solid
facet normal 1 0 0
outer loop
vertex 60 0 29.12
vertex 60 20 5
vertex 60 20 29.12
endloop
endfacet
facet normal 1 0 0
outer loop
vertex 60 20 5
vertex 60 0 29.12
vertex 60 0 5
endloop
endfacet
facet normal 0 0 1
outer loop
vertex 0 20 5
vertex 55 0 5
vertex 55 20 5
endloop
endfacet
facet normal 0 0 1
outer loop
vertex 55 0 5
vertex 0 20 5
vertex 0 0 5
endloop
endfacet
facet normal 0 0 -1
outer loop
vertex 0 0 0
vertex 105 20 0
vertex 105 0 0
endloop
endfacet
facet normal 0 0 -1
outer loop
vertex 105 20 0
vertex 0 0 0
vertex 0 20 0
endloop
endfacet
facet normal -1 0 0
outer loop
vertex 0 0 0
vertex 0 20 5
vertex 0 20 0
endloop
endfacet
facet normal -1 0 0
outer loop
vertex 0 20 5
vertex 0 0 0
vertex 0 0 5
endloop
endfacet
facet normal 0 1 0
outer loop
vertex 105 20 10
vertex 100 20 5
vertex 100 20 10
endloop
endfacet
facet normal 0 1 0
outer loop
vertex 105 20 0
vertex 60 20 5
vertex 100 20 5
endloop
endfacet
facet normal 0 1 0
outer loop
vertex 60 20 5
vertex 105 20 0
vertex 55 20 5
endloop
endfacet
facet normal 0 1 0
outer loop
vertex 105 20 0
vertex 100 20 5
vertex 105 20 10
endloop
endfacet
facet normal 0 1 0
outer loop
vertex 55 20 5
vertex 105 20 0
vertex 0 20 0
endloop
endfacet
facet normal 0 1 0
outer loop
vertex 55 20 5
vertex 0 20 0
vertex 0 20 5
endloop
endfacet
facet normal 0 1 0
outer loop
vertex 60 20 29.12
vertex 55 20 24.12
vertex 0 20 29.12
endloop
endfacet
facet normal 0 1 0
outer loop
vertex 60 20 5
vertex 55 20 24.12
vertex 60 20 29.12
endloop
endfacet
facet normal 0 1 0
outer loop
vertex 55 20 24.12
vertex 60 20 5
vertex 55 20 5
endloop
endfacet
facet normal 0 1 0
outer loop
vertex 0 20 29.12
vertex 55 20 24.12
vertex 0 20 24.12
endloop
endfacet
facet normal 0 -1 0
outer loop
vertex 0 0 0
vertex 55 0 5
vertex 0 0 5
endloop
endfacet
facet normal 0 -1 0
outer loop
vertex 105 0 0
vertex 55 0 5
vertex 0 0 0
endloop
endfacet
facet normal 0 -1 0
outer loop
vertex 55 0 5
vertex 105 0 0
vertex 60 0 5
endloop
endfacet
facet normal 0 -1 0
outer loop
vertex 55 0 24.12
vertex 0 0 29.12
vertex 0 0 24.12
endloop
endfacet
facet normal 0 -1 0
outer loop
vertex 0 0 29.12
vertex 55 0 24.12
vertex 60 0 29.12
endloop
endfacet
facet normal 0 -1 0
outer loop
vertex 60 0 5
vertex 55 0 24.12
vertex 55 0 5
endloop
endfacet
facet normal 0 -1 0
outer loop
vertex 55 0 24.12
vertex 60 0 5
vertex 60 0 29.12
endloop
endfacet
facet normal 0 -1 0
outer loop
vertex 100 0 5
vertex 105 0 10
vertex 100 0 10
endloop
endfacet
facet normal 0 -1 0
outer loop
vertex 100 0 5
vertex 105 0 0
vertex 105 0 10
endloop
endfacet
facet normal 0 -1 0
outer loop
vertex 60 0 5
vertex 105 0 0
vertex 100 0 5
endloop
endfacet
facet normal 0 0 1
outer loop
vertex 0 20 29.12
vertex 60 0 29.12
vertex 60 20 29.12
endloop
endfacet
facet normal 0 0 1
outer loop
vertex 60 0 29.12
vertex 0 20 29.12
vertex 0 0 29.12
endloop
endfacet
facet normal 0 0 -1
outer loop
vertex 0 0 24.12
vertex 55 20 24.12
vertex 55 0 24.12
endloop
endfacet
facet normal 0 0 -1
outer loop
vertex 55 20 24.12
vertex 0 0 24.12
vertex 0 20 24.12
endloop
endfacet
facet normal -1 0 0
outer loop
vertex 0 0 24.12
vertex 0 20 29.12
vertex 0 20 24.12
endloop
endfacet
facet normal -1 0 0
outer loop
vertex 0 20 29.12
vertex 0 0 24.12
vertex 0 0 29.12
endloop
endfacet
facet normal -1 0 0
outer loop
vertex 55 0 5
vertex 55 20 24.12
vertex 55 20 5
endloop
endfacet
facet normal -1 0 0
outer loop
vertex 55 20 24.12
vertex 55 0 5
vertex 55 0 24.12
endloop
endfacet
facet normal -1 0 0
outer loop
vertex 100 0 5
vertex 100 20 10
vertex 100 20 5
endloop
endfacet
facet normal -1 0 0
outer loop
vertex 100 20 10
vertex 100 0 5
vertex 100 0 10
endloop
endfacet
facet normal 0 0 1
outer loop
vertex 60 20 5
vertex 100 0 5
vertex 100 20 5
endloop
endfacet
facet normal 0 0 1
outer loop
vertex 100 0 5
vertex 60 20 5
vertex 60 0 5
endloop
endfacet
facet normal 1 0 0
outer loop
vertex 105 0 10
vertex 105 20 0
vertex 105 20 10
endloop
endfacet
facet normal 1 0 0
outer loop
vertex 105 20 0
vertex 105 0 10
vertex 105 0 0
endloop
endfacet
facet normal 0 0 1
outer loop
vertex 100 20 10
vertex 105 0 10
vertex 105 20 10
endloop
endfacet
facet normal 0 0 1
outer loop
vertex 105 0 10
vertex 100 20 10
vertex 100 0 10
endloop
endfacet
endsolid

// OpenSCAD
width = 20;
wall_strength = 5;
length_under_desk = 55;
desk_thickness = 19.12;
headphone_width = 40;
slip_off_protection_height = 5;

union() {
    color("red") cube([length_under_desk + wall_strength, width, wall_strength]);
    translate([0, 0, desk_thickness + wall_strength]) color("blue") cube([length_under_desk + wall_strength, width, wall_strength]);
    translate([length_under_desk, 0, wall_strength]) color("green") cube([wall_strength, width, desk_thickness]);
    translate([length_under_desk + wall_strength, 0, 0]) color("yellow") cube([headphone_width, width, wall_strength]);
    translate([length_under_desk + wall_strength + headphone_width, 0, 0]) color("orange") cube([wall_strength, width, wall_strength + slip_off_protection_height]);
}
